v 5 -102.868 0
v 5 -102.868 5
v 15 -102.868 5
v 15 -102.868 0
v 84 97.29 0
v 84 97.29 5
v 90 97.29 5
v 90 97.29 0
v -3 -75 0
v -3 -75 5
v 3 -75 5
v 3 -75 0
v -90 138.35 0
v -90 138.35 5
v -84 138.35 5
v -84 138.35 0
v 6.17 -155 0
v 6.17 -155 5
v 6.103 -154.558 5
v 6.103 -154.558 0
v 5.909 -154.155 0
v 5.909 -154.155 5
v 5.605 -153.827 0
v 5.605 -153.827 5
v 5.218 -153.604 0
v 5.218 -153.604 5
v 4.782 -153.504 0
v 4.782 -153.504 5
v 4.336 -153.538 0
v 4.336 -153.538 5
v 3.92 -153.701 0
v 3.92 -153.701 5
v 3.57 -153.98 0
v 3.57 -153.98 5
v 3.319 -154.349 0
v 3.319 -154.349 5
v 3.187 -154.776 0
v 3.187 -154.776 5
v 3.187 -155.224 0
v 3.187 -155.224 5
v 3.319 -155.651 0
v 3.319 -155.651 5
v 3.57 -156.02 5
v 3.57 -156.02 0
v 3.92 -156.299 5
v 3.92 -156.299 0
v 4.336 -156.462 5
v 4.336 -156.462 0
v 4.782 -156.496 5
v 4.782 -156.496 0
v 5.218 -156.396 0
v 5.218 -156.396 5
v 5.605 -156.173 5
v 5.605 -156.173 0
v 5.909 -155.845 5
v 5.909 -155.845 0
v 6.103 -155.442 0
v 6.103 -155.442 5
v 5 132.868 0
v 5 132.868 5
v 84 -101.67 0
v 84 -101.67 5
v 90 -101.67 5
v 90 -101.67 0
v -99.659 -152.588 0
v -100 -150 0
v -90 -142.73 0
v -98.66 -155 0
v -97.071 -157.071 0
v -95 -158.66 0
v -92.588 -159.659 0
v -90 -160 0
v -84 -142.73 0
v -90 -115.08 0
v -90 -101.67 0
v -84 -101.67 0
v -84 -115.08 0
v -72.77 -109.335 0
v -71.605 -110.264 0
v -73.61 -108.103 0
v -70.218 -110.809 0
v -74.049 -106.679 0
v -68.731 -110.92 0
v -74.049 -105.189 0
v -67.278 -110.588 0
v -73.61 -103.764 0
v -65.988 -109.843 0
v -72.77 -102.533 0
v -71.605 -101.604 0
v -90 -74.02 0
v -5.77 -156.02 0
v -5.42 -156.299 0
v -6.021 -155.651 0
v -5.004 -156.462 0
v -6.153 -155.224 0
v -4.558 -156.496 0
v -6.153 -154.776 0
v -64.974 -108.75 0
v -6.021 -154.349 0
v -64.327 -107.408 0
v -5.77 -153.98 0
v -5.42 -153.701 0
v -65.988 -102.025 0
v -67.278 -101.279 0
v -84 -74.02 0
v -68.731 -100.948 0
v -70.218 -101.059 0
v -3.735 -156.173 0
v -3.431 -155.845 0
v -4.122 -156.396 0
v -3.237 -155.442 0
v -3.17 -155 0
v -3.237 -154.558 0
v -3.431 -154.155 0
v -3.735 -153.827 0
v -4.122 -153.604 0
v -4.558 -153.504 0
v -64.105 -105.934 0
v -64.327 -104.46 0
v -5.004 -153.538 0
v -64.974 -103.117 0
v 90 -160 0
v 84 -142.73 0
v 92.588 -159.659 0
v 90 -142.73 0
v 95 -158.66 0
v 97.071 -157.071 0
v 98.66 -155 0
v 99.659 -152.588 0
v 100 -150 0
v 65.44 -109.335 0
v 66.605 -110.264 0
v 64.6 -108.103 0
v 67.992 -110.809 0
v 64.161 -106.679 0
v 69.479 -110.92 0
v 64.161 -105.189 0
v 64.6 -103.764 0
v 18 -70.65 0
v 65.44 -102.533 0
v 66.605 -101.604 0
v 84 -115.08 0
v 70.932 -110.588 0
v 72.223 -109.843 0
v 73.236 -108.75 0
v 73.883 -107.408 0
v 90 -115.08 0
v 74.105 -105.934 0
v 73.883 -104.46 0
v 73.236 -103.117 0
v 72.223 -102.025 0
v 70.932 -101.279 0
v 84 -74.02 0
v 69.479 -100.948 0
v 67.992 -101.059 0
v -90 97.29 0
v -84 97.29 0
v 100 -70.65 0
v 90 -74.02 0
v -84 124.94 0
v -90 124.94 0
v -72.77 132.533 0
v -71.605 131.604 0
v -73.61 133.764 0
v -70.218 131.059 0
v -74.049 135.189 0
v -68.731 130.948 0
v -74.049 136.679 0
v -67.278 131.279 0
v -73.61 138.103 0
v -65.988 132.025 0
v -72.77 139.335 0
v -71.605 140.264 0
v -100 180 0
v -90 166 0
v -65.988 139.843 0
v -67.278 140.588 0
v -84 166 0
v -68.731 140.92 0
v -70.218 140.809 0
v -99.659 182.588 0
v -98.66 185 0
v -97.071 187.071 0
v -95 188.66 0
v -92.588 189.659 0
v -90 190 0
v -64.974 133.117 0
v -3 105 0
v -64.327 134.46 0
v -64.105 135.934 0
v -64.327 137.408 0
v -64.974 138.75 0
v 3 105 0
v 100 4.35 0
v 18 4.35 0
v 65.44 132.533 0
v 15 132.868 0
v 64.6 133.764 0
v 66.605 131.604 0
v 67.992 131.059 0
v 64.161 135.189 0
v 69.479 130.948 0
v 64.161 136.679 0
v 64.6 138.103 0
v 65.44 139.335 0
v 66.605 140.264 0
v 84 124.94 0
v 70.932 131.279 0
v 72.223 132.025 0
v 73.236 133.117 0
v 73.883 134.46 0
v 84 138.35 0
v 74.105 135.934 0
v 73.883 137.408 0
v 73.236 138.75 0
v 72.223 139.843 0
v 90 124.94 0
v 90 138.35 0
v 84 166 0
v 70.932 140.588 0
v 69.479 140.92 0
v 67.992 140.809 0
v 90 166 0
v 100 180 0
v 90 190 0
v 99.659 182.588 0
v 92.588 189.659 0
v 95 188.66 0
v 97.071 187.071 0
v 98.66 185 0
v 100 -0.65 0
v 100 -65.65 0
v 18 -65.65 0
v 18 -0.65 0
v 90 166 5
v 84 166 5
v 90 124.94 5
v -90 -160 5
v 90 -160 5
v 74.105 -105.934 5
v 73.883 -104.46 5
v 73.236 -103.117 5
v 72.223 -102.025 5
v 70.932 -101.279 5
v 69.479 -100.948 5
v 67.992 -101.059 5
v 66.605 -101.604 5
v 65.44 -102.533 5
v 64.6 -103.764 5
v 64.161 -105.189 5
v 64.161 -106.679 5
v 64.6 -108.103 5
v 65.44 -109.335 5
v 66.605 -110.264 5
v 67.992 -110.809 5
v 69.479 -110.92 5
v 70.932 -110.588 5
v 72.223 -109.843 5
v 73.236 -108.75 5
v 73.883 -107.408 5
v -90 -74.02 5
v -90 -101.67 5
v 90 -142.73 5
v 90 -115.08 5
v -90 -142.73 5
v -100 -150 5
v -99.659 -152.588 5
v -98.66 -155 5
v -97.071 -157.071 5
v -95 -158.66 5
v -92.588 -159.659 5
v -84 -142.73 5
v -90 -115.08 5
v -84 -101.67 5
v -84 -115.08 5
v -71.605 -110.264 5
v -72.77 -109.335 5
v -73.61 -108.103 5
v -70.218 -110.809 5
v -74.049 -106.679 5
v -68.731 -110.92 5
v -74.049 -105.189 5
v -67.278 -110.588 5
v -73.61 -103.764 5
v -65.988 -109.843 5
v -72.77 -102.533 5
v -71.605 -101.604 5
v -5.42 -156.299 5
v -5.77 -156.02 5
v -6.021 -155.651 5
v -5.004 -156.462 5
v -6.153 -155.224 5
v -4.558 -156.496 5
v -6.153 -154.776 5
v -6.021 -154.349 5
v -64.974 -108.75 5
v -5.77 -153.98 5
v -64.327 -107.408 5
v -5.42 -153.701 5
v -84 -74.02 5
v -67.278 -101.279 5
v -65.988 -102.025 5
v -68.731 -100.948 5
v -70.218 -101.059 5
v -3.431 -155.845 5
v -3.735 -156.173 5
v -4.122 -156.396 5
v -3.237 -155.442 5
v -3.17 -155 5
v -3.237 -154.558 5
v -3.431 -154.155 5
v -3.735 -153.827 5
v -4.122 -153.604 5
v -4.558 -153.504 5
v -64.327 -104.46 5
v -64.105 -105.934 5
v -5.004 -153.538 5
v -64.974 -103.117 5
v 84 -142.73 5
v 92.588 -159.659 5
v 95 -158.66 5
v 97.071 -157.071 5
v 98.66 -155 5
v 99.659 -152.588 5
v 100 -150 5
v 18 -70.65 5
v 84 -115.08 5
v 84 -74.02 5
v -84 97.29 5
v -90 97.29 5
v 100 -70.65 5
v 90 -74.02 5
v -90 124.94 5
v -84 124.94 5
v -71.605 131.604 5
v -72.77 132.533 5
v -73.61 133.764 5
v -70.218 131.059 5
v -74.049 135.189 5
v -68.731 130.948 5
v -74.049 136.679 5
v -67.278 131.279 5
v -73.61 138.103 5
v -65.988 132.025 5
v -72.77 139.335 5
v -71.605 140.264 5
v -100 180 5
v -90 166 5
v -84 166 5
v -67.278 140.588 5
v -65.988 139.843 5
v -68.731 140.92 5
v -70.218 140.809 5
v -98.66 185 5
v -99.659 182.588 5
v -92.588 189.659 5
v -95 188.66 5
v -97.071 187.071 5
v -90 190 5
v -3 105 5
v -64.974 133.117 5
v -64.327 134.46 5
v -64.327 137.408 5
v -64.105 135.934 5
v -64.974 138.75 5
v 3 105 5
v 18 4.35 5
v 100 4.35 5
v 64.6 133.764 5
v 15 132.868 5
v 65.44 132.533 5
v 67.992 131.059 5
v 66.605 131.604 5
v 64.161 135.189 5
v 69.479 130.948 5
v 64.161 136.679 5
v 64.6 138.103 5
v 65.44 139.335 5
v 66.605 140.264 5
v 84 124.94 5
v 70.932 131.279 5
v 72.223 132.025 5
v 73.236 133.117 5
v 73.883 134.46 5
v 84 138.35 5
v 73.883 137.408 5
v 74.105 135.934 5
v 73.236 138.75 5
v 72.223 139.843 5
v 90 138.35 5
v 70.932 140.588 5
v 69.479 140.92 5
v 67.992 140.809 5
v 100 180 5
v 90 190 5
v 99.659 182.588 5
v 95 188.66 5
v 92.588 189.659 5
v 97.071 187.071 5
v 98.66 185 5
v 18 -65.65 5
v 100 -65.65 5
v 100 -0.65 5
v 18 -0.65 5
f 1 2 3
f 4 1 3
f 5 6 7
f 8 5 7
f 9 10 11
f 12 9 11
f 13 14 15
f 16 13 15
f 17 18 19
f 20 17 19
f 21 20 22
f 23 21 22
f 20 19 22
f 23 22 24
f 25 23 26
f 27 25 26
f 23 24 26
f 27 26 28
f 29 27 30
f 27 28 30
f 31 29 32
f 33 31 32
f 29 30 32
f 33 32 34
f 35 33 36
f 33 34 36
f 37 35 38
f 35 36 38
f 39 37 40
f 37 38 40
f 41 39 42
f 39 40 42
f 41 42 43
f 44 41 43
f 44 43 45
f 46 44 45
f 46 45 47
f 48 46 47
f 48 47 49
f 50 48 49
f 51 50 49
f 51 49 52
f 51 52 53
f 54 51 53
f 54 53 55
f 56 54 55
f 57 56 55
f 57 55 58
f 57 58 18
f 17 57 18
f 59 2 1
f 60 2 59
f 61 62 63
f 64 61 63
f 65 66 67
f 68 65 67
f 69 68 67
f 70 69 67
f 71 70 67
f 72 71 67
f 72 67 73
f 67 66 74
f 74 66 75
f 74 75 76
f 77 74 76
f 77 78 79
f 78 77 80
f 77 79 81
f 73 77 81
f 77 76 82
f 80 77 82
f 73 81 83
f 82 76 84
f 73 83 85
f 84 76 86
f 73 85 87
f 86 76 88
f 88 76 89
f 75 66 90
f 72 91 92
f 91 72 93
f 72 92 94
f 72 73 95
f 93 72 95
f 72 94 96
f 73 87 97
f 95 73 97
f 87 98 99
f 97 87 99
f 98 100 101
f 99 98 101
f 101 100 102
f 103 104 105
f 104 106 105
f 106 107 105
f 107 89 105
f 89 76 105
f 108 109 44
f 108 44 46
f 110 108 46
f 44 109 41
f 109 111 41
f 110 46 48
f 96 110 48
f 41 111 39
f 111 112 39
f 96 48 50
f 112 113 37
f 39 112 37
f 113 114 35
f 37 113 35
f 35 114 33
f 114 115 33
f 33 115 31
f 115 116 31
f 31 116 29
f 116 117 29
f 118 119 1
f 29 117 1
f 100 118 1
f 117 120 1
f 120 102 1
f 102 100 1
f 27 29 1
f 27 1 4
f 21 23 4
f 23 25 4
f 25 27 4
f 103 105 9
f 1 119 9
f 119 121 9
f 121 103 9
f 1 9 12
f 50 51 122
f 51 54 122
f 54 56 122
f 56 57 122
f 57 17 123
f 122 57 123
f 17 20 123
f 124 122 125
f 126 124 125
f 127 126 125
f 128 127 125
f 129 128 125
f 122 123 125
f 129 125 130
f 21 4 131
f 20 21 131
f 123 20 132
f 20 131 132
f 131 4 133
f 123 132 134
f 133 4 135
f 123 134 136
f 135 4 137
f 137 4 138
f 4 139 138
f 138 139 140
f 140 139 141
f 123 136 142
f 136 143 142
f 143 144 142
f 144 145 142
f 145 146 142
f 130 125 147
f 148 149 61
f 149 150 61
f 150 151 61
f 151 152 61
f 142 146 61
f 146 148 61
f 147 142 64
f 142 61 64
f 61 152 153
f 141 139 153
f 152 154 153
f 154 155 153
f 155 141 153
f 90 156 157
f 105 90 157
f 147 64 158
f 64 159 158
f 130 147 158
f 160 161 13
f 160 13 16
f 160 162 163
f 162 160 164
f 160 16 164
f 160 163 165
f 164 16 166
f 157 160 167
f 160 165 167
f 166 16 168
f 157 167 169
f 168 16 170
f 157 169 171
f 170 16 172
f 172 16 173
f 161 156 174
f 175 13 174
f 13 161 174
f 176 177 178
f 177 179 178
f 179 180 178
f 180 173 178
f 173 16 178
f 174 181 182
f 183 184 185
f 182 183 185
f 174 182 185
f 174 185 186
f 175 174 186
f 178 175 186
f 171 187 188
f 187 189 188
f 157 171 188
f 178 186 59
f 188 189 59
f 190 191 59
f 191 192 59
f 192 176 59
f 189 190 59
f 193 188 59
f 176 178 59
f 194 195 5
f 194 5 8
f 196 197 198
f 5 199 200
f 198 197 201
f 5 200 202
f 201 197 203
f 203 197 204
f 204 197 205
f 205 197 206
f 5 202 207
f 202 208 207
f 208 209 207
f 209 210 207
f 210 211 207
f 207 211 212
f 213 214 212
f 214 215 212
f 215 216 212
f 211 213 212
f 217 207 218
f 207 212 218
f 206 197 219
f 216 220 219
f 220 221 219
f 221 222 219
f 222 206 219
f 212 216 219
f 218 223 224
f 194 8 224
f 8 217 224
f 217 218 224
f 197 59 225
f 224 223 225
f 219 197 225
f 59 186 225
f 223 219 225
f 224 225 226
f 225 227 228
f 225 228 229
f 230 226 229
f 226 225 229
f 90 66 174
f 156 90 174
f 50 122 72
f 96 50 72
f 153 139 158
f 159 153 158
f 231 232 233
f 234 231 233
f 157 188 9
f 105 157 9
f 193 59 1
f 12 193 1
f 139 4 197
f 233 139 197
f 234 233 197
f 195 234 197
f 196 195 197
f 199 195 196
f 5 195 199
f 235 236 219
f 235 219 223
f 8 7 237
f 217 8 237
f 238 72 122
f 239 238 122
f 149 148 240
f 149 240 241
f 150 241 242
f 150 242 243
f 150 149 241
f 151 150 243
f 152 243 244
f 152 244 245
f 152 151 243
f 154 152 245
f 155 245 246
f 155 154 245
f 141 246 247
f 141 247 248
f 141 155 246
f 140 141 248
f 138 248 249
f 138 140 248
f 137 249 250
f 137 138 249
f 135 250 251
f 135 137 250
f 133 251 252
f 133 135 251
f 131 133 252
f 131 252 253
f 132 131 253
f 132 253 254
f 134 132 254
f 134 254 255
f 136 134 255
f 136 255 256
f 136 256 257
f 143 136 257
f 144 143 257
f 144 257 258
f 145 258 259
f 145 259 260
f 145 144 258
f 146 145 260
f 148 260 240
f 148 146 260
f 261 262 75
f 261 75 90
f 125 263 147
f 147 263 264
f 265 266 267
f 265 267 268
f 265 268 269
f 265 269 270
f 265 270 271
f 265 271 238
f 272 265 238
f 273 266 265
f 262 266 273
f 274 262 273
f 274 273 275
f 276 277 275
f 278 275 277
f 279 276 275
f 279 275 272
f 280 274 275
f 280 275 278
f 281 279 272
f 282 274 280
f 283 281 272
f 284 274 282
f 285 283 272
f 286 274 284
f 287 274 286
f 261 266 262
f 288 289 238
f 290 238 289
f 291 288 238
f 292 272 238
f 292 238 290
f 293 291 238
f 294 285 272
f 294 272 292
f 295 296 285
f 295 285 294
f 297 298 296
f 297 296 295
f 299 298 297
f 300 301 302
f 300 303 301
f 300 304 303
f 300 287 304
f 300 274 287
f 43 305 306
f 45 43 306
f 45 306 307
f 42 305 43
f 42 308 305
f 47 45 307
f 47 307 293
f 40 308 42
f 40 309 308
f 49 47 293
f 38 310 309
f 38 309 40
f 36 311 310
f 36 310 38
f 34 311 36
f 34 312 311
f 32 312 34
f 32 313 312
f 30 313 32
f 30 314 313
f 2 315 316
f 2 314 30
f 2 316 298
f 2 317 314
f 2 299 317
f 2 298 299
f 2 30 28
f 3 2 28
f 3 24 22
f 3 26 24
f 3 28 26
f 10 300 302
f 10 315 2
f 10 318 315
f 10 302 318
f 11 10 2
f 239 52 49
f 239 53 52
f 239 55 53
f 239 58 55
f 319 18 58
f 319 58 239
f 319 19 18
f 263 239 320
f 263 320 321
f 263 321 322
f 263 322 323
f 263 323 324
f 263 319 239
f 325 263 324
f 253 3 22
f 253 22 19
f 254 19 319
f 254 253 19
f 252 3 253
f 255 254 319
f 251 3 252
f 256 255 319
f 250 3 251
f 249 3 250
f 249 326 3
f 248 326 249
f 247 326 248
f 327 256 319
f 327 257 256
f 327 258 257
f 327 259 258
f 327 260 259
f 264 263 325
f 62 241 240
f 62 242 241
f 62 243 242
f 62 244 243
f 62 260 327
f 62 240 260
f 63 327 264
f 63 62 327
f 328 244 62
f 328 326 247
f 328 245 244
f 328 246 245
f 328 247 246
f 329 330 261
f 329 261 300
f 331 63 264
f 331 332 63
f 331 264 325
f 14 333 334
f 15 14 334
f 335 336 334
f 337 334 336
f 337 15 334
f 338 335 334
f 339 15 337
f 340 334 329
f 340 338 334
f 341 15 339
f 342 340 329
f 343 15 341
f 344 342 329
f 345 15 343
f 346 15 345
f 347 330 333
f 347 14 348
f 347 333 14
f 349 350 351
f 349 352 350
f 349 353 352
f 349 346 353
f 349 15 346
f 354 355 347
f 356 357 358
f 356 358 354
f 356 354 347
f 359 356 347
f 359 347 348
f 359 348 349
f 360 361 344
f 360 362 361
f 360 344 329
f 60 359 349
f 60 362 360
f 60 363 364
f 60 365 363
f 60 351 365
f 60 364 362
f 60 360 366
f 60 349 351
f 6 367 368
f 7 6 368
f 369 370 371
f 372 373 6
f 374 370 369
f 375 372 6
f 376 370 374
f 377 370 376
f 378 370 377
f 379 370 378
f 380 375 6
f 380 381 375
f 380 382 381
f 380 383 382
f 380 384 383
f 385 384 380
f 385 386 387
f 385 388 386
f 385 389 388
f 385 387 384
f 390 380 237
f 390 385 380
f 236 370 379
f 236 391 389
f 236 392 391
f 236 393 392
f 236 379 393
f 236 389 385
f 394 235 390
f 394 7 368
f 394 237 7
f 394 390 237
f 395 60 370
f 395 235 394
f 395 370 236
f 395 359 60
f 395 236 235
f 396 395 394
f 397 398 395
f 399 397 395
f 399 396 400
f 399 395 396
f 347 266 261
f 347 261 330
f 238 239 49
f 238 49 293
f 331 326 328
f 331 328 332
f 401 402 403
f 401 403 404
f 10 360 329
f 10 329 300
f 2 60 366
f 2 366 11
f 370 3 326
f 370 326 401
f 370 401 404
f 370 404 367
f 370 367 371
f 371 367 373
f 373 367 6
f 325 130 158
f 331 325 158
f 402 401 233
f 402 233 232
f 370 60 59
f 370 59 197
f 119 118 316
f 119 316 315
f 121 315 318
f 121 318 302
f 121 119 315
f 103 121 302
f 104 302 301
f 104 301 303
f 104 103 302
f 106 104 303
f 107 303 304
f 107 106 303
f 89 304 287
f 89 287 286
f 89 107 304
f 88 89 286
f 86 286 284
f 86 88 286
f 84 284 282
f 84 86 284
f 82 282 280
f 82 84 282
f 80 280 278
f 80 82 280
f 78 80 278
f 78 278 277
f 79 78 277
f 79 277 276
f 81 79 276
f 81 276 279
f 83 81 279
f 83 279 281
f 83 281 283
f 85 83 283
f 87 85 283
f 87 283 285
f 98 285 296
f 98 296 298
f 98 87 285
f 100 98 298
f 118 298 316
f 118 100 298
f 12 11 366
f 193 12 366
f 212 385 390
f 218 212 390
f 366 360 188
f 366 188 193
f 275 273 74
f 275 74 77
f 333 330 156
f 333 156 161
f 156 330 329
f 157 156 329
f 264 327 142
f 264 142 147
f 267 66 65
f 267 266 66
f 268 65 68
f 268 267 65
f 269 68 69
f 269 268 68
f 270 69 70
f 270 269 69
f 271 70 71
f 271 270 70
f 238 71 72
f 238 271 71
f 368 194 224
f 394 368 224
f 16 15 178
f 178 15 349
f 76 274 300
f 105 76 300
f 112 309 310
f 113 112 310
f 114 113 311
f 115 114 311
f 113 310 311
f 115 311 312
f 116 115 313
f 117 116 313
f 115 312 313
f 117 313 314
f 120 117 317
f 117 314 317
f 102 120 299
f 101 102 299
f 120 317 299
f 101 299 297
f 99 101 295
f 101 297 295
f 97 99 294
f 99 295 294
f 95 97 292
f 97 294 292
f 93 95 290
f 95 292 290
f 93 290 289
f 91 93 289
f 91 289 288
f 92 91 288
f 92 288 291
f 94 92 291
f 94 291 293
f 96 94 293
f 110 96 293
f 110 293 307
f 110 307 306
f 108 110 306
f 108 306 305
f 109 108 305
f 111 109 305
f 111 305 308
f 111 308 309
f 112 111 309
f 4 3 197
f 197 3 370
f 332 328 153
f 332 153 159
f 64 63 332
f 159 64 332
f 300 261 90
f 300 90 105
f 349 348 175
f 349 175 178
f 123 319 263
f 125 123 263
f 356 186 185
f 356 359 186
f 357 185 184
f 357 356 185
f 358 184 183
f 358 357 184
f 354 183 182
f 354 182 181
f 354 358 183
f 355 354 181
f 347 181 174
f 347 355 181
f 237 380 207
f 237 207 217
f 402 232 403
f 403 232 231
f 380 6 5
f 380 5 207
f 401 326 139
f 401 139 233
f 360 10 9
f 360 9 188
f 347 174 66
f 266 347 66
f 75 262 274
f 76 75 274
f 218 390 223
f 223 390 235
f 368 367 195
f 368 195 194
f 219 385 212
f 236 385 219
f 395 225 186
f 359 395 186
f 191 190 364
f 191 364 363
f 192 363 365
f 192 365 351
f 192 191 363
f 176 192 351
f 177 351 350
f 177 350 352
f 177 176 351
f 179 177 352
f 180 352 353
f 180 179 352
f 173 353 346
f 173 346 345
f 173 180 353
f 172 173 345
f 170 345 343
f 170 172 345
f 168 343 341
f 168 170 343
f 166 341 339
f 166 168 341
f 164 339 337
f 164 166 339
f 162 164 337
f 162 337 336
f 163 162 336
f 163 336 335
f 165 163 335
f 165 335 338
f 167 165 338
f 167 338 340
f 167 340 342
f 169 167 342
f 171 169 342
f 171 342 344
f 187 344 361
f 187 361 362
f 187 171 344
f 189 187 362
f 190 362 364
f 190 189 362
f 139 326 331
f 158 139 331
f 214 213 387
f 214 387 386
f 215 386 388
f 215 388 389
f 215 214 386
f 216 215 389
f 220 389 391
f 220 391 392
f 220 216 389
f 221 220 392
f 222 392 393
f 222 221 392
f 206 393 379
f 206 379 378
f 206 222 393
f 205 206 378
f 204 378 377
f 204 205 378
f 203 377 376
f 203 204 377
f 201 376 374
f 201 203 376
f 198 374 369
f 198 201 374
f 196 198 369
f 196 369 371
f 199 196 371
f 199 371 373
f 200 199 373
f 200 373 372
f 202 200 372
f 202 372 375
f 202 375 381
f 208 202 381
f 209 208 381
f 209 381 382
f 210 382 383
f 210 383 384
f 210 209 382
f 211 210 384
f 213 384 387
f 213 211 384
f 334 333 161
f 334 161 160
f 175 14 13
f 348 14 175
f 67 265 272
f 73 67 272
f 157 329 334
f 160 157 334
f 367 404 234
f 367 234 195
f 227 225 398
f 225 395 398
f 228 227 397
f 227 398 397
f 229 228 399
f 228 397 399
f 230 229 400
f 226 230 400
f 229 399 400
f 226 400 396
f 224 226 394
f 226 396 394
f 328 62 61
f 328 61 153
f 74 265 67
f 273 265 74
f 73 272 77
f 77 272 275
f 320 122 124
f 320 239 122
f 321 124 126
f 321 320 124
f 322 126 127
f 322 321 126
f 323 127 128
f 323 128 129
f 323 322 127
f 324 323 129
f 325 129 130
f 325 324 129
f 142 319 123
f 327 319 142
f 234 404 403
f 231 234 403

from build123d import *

# Parameters (mm, degrees)
SKETCH1_R           = 5
BOSS_EXTRUDE1_DEPTH = 5
SKETCH4_W           = 6
SKETCH4_H           = 180
SKETCH4_W_2         = 10
SKETCH4_H_2         = 235.736115182
SKETCH4_W_3         = 82
SKETCH4_H_3         = 5
CUT_EXTRUDE1_DEPTH  = 10
SKETCH5_R           = 1.5
SKETCH5_W           = 6
SKETCH5_H           = 27.65
CUT_EXTRUDE2_DEPTH  = 6
FILLET1_R           = 10


with BuildPart() as part:
    # Sketch1 → Boss-Extrude1 (new body)
    with BuildSketch(Plane.XY):
        Polygon((100, 190), (-100, 190), (-100, -90), (-100, -160), (100, -160), (100, -90), align=None)
        with Locations((-69.105066414, 135.933866224)):
            Circle(SKETCH1_R, mode=Mode.SUBTRACT)
        with Locations((69.105066414, 135.933866224)):
            Circle(SKETCH1_R, mode=Mode.SUBTRACT)
        with Locations((69.105066414, -105.933866224)):
            Circle(SKETCH1_R, mode=Mode.SUBTRACT)
        with Locations((-69.105066414, -105.933866224)):
            Circle(SKETCH1_R, mode=Mode.SUBTRACT)
    extrude(amount=BOSS_EXTRUDE1_DEPTH)

    # Sketch4 → Cut-Extrude1 (cut)
    with BuildSketch(Plane.XY.offset(5)):
        with Locations((0, 15)):
            Rectangle(SKETCH4_W, SKETCH4_H)
        with Locations((10, 15)):
            Rectangle(SKETCH4_W_2, SKETCH4_H_2)
        with Locations((59, -68.15)):
            Rectangle(SKETCH4_W_3, SKETCH4_H_3)
        with Locations((59, 1.85)):
            Rectangle(SKETCH4_W_3, SKETCH4_H_3)
    extrude(amount=-CUT_EXTRUDE1_DEPTH, mode=Mode.SUBTRACT)

    # Sketch5 → Cut-Extrude2 (cut, through all)
    with BuildSketch(Plane.XY.offset(5)):
        with Locations((4.67, -155)):
            Circle(SKETCH5_R)
        with Locations((-4.67, -155)):
            Circle(SKETCH5_R)
        with Locations((-87, 152.175)):
            Rectangle(SKETCH5_W, SKETCH5_H)
        with Locations((-87, 111.115)):
            Rectangle(SKETCH5_W, SKETCH5_H)
        with Locations((-87, -87.845)):
            Rectangle(SKETCH5_W, SKETCH5_H)
        with Locations((-87, -128.905)):
            Rectangle(SKETCH5_W, SKETCH5_H)
        with Locations((87, -87.845)):
            Rectangle(SKETCH5_W, SKETCH5_H)
        with Locations((87, -128.905)):
            Rectangle(SKETCH5_W, SKETCH5_H)
        with Locations((87, 152.175)):
            Rectangle(SKETCH5_W, SKETCH5_H)
        with Locations((87, 111.115)):
            Rectangle(SKETCH5_W, SKETCH5_H)
    extrude(amount=-CUT_EXTRUDE2_DEPTH, mode=Mode.SUBTRACT)

    # Fillet1
    fillet1_edges = [part.edges().sort_by_distance(p)[0] for p in [
        (-100, 190, 2.5),
        (100, 190, 2.5),
        (100, -160, 2.5),
        (-100, -160, 2.5),
    ]]
    fillet(fillet1_edges, radius=FILLET1_R)


solid = part.part
